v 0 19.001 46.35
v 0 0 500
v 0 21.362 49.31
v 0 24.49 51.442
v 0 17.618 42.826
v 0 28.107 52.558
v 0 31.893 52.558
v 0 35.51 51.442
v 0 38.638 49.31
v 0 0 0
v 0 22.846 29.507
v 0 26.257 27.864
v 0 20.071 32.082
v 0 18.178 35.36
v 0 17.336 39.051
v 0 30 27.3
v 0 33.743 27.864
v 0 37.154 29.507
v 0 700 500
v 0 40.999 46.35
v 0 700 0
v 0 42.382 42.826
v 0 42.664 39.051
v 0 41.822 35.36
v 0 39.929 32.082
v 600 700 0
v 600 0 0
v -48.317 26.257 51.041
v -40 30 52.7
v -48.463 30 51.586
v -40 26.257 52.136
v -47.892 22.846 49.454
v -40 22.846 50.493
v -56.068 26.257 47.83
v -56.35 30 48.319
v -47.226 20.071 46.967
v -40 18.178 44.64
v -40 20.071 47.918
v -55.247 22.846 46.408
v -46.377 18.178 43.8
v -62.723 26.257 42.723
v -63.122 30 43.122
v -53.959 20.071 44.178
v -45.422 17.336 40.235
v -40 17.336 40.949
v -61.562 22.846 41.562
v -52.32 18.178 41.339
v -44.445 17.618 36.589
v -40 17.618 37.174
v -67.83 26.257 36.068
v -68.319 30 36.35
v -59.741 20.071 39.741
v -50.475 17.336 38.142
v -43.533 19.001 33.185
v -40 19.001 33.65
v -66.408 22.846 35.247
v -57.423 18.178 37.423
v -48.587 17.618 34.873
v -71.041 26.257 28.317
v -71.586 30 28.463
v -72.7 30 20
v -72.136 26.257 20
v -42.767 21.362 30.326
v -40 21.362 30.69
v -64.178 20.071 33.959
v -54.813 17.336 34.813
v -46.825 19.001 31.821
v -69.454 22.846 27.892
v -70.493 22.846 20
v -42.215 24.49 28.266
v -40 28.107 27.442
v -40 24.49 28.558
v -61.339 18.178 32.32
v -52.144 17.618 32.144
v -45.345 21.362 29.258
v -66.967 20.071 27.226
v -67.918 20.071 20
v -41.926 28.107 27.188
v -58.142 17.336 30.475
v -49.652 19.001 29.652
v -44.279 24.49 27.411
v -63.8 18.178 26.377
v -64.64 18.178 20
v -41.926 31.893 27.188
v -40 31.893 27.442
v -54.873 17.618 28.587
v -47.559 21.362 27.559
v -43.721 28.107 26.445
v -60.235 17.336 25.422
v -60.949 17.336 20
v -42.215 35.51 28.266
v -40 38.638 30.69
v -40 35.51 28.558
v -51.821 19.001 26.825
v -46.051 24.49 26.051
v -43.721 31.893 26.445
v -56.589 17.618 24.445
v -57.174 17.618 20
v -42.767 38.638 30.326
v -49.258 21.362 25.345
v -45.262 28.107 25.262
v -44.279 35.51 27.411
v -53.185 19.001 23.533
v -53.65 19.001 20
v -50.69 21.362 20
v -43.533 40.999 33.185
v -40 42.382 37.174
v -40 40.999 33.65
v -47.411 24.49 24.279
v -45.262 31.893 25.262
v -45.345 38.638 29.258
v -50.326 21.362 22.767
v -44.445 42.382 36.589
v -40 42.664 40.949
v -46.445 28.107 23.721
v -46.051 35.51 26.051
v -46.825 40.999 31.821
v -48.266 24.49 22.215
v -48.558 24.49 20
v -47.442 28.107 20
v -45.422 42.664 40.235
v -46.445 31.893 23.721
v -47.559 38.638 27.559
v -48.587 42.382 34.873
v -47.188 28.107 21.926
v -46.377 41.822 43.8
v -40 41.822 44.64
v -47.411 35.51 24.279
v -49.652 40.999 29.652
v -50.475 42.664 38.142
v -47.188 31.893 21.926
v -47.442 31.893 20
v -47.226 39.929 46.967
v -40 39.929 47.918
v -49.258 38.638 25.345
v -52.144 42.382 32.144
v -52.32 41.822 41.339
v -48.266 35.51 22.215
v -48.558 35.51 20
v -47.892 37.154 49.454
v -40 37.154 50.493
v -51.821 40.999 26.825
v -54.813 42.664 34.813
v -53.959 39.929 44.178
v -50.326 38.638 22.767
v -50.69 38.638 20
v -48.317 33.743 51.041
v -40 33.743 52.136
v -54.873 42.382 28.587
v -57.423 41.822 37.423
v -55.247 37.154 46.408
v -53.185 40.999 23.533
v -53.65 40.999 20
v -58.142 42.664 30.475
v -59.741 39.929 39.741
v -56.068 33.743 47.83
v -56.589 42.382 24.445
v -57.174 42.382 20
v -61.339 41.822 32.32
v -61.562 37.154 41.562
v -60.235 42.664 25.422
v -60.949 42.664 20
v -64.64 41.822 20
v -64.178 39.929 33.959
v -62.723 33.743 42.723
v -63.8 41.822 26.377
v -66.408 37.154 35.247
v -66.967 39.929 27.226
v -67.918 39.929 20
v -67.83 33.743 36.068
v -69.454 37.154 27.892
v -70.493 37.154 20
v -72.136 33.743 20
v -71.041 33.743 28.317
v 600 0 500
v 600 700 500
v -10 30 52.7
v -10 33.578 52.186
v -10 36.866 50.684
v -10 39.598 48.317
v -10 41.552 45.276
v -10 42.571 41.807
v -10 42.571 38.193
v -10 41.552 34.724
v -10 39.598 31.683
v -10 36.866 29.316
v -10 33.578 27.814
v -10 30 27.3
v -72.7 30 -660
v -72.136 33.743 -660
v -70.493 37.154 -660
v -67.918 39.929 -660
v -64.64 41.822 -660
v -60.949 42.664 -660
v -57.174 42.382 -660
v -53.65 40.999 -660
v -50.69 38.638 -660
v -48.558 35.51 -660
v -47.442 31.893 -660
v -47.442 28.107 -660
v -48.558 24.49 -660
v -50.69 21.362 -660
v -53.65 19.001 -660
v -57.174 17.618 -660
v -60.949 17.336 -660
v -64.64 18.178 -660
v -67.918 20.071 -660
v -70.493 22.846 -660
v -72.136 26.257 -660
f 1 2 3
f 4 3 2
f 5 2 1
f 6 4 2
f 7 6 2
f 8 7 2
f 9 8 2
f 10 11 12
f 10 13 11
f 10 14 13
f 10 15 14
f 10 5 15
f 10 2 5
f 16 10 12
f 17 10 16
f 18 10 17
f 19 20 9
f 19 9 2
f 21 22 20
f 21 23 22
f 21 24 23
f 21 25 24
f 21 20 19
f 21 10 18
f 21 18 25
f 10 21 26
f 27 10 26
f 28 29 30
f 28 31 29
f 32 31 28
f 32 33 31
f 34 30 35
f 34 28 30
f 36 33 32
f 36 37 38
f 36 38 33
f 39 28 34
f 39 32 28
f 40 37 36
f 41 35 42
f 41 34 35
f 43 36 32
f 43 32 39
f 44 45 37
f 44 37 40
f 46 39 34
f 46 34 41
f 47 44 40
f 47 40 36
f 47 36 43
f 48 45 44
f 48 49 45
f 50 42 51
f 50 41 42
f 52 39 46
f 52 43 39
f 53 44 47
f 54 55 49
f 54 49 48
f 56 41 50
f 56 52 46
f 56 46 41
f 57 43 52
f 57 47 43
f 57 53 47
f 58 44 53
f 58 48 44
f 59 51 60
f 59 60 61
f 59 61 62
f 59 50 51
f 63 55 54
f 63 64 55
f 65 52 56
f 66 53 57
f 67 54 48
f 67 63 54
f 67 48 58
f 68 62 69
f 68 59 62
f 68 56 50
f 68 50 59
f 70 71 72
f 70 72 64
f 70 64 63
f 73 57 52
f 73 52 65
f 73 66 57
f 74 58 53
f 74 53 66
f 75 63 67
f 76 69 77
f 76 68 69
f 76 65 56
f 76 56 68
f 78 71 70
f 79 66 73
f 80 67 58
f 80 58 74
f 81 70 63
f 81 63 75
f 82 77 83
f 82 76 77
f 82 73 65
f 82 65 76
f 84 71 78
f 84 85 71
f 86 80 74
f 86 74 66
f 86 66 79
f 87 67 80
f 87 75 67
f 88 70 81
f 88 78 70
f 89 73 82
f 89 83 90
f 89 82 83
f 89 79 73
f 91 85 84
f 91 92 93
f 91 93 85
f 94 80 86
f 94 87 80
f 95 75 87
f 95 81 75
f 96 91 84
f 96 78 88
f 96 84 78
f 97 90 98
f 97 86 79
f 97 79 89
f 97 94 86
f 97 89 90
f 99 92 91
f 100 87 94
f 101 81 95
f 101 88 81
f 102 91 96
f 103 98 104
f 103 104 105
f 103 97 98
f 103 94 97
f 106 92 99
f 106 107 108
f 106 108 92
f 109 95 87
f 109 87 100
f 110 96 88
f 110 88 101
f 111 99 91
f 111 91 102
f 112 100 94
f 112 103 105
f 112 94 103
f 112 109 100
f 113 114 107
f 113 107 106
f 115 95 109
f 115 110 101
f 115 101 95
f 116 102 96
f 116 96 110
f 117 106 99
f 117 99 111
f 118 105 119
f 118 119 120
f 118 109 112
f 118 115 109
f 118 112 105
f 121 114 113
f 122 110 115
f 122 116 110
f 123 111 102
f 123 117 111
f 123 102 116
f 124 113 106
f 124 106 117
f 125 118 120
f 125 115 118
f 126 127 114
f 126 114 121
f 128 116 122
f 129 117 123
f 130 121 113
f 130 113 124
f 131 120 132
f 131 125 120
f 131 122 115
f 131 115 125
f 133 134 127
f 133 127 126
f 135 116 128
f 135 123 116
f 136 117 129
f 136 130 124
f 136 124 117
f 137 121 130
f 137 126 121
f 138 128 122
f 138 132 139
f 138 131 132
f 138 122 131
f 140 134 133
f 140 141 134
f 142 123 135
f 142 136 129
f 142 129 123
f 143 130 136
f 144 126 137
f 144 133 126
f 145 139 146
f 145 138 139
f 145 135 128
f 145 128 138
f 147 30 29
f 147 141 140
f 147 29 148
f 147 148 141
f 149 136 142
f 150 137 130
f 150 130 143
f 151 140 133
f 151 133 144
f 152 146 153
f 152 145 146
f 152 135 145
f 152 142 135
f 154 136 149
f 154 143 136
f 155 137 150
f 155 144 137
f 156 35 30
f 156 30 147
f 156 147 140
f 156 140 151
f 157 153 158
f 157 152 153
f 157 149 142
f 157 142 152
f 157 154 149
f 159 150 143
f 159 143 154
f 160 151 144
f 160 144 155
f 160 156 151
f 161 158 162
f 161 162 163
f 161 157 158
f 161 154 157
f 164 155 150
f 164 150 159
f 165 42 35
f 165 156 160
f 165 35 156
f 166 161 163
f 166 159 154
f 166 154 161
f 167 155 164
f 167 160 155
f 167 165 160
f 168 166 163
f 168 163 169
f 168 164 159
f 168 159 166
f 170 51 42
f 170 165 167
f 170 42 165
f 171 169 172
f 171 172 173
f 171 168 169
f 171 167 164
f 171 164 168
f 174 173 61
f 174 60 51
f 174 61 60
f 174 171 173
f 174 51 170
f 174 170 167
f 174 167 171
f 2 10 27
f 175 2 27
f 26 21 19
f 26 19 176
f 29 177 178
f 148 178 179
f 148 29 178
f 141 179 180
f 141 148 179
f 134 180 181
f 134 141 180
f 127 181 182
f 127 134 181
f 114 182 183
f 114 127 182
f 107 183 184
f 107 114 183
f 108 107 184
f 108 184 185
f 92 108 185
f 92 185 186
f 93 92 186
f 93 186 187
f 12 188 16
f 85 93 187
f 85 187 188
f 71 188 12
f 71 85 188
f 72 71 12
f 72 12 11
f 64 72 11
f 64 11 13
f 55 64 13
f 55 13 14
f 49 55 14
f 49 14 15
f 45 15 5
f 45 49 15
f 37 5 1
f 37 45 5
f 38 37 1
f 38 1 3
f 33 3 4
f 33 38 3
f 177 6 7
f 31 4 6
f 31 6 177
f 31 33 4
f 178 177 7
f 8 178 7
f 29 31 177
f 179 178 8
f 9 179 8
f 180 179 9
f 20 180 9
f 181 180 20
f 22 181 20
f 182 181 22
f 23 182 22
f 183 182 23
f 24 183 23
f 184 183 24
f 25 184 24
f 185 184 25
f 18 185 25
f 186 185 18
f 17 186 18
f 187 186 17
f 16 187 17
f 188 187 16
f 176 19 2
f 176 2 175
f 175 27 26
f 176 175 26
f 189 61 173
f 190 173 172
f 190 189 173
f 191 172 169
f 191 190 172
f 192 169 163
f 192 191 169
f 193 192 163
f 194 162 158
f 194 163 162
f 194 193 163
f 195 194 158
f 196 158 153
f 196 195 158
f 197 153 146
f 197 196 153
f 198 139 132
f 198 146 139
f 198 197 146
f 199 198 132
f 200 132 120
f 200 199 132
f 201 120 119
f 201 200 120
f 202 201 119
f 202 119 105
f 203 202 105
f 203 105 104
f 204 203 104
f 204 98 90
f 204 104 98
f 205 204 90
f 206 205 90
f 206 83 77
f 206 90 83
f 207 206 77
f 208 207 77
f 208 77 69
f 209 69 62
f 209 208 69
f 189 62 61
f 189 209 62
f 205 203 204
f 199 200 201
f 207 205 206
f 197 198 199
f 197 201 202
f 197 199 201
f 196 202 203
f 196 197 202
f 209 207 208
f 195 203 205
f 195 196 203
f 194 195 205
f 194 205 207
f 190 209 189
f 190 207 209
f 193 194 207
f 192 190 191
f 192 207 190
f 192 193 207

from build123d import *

# Parameters (mm, degrees)
CROQUIS1_W              = 600
CROQUIS1_H              = 700
SALIENTE_EXTRUIR1_DEPTH = 500
CROQUIS2_R              = 12.7
SALIENTE_EXTRUIR2_DEPTH = 10
CROQUIS3_R              = 12.7


with BuildPart() as part:
    # Croquis1 → Saliente-Extruir1 (new body)
    with BuildSketch(Plane.XY):
        with Locations((300, 350)):
            Rectangle(CROQUIS1_W, CROQUIS1_H)
    extrude(amount=SALIENTE_EXTRUIR1_DEPTH)

    # Croquis2 → Saliente-Extruir2 (add)
    with BuildSketch(Plane.ZY):
        with Locations(Location((40, 30, 0), (0, 0, 180))):
            Circle(CROQUIS2_R)
    extrude(amount=SALIENTE_EXTRUIR2_DEPTH)

    # Barrer1: sweep along a curve in space
    with BuildLine() as barrer1_path:
        Line((-10, 30, 40), (-40, 30, 40))
        ThreePointArc((-40, 30, 40), (-54.142135624, 30, 34.142135624), (-60, 30, 20))
        Line((-60, 30, 20), (-60, 30, -660))
    # Croquis3 → Barrer1 (sweep)
    with BuildSketch(Plane.ZY.offset(10)):
        with Locations((40, 30)):
            Circle(CROQUIS3_R)
    sweep(path=barrer1_path.line)


solid = part.part
